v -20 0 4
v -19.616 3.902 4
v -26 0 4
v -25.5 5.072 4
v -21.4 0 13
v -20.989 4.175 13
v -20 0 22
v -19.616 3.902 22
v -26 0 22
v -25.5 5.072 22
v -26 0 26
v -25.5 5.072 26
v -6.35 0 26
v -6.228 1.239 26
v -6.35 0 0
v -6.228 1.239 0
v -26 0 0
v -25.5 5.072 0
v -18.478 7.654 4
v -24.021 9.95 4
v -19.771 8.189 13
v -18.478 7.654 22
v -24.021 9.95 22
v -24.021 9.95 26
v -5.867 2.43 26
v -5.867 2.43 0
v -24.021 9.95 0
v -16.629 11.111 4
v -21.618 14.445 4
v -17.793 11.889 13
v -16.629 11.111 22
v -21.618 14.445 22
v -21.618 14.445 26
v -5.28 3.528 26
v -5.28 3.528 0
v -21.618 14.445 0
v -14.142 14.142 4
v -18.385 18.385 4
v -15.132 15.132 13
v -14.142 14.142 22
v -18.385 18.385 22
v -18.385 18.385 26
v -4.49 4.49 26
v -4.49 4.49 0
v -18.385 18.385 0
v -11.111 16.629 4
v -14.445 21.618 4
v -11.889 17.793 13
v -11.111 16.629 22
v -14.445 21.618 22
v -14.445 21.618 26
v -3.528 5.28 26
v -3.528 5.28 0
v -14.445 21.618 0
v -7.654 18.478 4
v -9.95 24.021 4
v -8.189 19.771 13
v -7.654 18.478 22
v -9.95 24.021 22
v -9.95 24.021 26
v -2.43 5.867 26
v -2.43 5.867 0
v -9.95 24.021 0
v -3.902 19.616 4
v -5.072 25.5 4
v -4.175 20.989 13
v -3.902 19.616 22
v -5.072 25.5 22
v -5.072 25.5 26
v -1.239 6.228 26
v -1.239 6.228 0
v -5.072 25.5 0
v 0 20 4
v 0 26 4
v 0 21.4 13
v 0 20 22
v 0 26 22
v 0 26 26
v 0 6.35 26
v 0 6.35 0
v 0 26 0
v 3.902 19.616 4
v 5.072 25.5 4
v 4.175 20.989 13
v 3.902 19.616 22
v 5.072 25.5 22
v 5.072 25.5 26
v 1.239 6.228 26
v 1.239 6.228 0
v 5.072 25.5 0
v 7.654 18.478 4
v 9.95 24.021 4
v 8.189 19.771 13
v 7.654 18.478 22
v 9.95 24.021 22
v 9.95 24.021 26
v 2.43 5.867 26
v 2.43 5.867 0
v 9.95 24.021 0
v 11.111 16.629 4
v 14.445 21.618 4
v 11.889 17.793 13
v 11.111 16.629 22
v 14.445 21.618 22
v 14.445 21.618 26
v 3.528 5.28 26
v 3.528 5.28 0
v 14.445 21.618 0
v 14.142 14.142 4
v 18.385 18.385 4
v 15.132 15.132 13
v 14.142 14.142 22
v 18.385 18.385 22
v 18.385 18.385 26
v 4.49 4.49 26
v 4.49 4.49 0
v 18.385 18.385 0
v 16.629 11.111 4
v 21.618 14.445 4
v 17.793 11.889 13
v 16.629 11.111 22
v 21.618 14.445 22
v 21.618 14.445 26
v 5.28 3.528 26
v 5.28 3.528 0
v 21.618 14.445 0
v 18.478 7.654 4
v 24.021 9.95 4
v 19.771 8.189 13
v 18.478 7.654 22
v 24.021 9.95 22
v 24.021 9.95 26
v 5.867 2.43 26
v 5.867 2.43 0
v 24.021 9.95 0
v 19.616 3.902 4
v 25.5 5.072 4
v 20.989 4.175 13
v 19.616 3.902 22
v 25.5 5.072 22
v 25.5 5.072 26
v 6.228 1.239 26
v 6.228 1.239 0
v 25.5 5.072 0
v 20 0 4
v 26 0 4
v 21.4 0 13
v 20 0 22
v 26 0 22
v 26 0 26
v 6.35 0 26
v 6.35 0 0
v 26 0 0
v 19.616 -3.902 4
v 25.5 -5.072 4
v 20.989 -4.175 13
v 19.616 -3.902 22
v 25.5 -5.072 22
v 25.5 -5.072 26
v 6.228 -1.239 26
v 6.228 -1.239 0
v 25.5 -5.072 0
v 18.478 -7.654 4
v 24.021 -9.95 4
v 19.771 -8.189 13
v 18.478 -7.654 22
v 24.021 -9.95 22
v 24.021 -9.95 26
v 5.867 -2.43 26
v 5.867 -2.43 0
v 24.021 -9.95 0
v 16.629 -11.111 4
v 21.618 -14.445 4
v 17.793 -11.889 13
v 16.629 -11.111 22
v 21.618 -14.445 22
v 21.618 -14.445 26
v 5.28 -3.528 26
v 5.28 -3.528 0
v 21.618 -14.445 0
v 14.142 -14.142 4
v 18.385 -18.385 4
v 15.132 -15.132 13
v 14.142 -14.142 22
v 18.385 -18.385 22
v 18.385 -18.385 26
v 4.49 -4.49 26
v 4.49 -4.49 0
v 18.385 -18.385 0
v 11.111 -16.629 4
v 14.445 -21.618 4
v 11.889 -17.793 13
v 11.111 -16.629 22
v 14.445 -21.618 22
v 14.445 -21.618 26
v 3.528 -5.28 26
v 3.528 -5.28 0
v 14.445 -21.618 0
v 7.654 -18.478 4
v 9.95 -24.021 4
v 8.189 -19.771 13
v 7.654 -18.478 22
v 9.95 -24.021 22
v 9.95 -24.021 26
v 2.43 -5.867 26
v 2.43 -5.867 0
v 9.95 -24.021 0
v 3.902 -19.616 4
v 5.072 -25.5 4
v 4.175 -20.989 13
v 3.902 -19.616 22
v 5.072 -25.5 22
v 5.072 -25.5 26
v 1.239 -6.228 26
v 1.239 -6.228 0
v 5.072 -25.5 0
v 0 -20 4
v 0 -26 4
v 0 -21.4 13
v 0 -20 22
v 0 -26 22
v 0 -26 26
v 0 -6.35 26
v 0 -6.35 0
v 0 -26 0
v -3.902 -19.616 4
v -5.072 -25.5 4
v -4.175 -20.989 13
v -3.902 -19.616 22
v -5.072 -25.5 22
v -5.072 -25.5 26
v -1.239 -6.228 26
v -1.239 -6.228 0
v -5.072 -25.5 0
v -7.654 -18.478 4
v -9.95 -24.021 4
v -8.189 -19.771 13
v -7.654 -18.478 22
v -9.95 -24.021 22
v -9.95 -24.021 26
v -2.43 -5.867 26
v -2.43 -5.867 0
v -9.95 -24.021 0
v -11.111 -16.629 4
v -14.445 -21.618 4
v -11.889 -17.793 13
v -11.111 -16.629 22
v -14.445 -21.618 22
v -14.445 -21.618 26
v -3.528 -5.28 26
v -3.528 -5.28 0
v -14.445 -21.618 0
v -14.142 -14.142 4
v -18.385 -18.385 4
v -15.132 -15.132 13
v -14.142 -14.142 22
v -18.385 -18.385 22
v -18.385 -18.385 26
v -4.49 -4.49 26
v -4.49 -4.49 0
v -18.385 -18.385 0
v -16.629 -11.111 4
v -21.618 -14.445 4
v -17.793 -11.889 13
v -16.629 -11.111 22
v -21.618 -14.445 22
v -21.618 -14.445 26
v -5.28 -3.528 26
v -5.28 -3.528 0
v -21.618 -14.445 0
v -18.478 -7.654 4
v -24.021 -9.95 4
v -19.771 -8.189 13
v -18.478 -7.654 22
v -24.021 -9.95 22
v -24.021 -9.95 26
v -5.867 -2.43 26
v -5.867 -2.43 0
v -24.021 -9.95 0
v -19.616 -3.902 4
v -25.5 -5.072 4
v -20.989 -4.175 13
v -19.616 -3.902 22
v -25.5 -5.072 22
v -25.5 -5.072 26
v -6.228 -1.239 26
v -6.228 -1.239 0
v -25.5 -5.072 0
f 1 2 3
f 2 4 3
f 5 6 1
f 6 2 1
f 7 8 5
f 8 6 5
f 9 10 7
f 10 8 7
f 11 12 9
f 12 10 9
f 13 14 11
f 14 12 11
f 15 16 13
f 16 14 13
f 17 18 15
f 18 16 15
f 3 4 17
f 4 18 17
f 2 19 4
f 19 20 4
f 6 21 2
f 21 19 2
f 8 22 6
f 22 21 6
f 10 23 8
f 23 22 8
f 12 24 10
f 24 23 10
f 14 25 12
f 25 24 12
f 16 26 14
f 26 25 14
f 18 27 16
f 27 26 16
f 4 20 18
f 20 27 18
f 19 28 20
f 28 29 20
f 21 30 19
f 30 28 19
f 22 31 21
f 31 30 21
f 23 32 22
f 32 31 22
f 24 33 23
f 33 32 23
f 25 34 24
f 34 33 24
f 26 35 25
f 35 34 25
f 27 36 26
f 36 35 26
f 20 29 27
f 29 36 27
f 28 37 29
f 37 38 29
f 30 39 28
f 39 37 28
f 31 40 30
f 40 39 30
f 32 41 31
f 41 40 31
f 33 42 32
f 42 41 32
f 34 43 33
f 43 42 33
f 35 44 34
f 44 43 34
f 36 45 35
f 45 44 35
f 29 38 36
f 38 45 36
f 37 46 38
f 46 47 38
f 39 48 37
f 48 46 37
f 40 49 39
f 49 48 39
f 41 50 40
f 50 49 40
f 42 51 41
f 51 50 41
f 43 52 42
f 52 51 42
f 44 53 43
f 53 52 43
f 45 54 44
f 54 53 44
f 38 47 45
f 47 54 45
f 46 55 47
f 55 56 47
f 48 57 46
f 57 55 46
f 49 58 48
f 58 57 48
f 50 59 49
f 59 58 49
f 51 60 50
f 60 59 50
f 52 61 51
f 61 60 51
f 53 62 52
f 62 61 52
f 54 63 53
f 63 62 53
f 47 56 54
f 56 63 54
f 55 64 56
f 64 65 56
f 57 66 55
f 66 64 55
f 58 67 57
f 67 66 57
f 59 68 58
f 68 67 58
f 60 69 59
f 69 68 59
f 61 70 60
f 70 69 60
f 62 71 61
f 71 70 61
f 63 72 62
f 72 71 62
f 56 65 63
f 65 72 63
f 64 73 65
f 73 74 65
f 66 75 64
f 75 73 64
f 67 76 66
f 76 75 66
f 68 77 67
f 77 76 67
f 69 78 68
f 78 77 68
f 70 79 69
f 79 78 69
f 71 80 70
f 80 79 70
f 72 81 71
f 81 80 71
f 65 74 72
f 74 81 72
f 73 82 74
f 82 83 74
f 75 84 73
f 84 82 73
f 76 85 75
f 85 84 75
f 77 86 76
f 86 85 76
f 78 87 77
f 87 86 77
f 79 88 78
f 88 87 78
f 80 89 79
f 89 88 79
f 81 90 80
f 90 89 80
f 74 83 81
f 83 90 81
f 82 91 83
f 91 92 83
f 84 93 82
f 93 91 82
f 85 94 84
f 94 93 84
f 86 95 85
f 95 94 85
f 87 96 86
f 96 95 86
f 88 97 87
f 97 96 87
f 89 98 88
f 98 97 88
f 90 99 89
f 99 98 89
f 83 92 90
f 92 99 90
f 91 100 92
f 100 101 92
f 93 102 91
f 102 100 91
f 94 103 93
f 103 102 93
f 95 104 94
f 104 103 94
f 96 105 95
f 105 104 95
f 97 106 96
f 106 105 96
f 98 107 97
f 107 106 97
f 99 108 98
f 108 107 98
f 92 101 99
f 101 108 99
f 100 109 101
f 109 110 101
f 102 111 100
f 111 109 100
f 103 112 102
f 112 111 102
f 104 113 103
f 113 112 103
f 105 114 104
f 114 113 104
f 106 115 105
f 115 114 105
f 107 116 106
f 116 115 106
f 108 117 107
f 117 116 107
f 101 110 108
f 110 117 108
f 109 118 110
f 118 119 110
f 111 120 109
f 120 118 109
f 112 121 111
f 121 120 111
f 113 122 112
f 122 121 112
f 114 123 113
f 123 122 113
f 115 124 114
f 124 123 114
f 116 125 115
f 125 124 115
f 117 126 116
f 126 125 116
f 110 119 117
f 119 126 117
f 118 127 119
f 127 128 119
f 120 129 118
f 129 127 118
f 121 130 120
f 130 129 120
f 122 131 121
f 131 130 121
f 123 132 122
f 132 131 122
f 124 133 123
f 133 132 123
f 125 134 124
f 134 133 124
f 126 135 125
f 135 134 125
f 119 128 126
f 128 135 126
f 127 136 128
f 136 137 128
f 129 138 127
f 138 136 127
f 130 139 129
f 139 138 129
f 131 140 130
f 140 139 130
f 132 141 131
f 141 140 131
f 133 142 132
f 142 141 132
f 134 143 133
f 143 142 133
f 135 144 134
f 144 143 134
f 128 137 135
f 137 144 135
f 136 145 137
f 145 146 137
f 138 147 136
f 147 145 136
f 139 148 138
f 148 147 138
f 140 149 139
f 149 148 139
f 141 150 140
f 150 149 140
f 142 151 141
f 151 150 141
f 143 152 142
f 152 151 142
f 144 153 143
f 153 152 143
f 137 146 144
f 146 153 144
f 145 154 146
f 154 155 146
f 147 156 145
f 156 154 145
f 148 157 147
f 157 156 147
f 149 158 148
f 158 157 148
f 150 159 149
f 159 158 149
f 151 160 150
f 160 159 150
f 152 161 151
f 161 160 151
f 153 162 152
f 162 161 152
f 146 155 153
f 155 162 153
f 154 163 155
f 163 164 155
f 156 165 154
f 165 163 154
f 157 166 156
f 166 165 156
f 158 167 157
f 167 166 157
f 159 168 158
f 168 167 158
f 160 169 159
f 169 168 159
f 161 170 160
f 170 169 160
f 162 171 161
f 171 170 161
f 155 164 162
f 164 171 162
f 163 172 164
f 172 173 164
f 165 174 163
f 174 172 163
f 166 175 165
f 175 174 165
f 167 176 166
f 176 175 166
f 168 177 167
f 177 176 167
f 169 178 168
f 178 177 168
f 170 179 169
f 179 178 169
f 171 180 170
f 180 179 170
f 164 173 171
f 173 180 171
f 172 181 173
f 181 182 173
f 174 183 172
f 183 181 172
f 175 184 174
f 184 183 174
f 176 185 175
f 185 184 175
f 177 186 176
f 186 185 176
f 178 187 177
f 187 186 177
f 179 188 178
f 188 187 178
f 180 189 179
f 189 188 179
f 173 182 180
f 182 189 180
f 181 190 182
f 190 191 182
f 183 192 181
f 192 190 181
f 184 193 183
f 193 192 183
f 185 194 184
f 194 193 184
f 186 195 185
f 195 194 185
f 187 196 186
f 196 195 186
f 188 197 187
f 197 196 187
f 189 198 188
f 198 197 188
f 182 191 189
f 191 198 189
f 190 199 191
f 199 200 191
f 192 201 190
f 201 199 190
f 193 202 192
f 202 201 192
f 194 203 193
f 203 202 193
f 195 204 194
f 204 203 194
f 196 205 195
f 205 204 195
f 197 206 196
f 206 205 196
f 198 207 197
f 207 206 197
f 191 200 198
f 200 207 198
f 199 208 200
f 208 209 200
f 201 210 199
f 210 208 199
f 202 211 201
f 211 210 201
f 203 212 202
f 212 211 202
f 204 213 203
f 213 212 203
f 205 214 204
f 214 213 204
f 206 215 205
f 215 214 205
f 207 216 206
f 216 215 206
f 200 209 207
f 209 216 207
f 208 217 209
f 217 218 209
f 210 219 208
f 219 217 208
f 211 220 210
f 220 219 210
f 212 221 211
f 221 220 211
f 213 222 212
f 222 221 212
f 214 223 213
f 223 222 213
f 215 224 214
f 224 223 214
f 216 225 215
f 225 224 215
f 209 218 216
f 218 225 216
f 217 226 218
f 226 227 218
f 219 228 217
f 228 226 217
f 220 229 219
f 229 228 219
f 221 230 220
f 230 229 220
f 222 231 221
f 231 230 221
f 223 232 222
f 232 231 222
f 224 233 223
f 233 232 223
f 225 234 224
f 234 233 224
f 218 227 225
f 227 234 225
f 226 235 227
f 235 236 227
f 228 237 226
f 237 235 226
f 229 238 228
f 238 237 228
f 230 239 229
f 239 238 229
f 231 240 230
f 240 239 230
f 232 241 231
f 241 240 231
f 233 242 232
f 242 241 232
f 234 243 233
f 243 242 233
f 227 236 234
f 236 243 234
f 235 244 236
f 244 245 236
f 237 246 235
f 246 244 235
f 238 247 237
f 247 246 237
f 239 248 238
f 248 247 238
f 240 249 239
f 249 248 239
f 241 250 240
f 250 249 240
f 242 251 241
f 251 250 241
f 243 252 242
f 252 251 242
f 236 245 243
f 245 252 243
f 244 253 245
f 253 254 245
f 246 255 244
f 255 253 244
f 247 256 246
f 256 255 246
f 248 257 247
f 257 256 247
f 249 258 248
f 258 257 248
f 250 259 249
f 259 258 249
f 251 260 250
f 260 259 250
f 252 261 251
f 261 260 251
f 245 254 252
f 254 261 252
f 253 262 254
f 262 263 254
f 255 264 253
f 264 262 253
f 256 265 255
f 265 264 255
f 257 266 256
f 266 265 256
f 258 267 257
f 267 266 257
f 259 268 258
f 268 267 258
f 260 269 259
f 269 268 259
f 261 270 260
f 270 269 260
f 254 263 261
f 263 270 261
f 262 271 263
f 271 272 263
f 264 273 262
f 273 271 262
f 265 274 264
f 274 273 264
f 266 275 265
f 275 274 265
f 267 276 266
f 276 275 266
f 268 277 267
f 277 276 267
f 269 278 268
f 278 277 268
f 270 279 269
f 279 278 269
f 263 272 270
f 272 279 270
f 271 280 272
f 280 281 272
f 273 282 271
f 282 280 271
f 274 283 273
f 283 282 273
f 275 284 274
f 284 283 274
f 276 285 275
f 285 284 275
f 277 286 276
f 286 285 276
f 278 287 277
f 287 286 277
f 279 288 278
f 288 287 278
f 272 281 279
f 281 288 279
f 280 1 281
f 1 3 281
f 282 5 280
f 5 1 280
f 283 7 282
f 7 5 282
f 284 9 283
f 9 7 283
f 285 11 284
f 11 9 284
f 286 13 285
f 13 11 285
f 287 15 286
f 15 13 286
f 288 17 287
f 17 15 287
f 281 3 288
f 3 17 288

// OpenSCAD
$fn = 32;

// ----------------------------------------------------------------------
// Belt roller: 40 mm barrel, 26 mm wide, bore 12.7 mm
// ----------------------------------------------------------------------

// --- parameters (mm) ---
bore_d = 12.7;            // bore
barrel_d = 40;            // barrel diameter
roller_w = 26;            // roller width
flange_d = 52;            // flange diameter
flange_t = 4;             // flange thickness
hub_d = 28.7;             // hub diameter

roller_profile = [[6.35, 0], [26, 0], [26, 4], [20, 4], [21.4, 13], [20, 22], [26, 22], [26, 26], [6.35, 26]];

/* the profile stays clear of the axis, so the bore comes out of the revolve */
rotate_extrude() polygon(roller_profile);
